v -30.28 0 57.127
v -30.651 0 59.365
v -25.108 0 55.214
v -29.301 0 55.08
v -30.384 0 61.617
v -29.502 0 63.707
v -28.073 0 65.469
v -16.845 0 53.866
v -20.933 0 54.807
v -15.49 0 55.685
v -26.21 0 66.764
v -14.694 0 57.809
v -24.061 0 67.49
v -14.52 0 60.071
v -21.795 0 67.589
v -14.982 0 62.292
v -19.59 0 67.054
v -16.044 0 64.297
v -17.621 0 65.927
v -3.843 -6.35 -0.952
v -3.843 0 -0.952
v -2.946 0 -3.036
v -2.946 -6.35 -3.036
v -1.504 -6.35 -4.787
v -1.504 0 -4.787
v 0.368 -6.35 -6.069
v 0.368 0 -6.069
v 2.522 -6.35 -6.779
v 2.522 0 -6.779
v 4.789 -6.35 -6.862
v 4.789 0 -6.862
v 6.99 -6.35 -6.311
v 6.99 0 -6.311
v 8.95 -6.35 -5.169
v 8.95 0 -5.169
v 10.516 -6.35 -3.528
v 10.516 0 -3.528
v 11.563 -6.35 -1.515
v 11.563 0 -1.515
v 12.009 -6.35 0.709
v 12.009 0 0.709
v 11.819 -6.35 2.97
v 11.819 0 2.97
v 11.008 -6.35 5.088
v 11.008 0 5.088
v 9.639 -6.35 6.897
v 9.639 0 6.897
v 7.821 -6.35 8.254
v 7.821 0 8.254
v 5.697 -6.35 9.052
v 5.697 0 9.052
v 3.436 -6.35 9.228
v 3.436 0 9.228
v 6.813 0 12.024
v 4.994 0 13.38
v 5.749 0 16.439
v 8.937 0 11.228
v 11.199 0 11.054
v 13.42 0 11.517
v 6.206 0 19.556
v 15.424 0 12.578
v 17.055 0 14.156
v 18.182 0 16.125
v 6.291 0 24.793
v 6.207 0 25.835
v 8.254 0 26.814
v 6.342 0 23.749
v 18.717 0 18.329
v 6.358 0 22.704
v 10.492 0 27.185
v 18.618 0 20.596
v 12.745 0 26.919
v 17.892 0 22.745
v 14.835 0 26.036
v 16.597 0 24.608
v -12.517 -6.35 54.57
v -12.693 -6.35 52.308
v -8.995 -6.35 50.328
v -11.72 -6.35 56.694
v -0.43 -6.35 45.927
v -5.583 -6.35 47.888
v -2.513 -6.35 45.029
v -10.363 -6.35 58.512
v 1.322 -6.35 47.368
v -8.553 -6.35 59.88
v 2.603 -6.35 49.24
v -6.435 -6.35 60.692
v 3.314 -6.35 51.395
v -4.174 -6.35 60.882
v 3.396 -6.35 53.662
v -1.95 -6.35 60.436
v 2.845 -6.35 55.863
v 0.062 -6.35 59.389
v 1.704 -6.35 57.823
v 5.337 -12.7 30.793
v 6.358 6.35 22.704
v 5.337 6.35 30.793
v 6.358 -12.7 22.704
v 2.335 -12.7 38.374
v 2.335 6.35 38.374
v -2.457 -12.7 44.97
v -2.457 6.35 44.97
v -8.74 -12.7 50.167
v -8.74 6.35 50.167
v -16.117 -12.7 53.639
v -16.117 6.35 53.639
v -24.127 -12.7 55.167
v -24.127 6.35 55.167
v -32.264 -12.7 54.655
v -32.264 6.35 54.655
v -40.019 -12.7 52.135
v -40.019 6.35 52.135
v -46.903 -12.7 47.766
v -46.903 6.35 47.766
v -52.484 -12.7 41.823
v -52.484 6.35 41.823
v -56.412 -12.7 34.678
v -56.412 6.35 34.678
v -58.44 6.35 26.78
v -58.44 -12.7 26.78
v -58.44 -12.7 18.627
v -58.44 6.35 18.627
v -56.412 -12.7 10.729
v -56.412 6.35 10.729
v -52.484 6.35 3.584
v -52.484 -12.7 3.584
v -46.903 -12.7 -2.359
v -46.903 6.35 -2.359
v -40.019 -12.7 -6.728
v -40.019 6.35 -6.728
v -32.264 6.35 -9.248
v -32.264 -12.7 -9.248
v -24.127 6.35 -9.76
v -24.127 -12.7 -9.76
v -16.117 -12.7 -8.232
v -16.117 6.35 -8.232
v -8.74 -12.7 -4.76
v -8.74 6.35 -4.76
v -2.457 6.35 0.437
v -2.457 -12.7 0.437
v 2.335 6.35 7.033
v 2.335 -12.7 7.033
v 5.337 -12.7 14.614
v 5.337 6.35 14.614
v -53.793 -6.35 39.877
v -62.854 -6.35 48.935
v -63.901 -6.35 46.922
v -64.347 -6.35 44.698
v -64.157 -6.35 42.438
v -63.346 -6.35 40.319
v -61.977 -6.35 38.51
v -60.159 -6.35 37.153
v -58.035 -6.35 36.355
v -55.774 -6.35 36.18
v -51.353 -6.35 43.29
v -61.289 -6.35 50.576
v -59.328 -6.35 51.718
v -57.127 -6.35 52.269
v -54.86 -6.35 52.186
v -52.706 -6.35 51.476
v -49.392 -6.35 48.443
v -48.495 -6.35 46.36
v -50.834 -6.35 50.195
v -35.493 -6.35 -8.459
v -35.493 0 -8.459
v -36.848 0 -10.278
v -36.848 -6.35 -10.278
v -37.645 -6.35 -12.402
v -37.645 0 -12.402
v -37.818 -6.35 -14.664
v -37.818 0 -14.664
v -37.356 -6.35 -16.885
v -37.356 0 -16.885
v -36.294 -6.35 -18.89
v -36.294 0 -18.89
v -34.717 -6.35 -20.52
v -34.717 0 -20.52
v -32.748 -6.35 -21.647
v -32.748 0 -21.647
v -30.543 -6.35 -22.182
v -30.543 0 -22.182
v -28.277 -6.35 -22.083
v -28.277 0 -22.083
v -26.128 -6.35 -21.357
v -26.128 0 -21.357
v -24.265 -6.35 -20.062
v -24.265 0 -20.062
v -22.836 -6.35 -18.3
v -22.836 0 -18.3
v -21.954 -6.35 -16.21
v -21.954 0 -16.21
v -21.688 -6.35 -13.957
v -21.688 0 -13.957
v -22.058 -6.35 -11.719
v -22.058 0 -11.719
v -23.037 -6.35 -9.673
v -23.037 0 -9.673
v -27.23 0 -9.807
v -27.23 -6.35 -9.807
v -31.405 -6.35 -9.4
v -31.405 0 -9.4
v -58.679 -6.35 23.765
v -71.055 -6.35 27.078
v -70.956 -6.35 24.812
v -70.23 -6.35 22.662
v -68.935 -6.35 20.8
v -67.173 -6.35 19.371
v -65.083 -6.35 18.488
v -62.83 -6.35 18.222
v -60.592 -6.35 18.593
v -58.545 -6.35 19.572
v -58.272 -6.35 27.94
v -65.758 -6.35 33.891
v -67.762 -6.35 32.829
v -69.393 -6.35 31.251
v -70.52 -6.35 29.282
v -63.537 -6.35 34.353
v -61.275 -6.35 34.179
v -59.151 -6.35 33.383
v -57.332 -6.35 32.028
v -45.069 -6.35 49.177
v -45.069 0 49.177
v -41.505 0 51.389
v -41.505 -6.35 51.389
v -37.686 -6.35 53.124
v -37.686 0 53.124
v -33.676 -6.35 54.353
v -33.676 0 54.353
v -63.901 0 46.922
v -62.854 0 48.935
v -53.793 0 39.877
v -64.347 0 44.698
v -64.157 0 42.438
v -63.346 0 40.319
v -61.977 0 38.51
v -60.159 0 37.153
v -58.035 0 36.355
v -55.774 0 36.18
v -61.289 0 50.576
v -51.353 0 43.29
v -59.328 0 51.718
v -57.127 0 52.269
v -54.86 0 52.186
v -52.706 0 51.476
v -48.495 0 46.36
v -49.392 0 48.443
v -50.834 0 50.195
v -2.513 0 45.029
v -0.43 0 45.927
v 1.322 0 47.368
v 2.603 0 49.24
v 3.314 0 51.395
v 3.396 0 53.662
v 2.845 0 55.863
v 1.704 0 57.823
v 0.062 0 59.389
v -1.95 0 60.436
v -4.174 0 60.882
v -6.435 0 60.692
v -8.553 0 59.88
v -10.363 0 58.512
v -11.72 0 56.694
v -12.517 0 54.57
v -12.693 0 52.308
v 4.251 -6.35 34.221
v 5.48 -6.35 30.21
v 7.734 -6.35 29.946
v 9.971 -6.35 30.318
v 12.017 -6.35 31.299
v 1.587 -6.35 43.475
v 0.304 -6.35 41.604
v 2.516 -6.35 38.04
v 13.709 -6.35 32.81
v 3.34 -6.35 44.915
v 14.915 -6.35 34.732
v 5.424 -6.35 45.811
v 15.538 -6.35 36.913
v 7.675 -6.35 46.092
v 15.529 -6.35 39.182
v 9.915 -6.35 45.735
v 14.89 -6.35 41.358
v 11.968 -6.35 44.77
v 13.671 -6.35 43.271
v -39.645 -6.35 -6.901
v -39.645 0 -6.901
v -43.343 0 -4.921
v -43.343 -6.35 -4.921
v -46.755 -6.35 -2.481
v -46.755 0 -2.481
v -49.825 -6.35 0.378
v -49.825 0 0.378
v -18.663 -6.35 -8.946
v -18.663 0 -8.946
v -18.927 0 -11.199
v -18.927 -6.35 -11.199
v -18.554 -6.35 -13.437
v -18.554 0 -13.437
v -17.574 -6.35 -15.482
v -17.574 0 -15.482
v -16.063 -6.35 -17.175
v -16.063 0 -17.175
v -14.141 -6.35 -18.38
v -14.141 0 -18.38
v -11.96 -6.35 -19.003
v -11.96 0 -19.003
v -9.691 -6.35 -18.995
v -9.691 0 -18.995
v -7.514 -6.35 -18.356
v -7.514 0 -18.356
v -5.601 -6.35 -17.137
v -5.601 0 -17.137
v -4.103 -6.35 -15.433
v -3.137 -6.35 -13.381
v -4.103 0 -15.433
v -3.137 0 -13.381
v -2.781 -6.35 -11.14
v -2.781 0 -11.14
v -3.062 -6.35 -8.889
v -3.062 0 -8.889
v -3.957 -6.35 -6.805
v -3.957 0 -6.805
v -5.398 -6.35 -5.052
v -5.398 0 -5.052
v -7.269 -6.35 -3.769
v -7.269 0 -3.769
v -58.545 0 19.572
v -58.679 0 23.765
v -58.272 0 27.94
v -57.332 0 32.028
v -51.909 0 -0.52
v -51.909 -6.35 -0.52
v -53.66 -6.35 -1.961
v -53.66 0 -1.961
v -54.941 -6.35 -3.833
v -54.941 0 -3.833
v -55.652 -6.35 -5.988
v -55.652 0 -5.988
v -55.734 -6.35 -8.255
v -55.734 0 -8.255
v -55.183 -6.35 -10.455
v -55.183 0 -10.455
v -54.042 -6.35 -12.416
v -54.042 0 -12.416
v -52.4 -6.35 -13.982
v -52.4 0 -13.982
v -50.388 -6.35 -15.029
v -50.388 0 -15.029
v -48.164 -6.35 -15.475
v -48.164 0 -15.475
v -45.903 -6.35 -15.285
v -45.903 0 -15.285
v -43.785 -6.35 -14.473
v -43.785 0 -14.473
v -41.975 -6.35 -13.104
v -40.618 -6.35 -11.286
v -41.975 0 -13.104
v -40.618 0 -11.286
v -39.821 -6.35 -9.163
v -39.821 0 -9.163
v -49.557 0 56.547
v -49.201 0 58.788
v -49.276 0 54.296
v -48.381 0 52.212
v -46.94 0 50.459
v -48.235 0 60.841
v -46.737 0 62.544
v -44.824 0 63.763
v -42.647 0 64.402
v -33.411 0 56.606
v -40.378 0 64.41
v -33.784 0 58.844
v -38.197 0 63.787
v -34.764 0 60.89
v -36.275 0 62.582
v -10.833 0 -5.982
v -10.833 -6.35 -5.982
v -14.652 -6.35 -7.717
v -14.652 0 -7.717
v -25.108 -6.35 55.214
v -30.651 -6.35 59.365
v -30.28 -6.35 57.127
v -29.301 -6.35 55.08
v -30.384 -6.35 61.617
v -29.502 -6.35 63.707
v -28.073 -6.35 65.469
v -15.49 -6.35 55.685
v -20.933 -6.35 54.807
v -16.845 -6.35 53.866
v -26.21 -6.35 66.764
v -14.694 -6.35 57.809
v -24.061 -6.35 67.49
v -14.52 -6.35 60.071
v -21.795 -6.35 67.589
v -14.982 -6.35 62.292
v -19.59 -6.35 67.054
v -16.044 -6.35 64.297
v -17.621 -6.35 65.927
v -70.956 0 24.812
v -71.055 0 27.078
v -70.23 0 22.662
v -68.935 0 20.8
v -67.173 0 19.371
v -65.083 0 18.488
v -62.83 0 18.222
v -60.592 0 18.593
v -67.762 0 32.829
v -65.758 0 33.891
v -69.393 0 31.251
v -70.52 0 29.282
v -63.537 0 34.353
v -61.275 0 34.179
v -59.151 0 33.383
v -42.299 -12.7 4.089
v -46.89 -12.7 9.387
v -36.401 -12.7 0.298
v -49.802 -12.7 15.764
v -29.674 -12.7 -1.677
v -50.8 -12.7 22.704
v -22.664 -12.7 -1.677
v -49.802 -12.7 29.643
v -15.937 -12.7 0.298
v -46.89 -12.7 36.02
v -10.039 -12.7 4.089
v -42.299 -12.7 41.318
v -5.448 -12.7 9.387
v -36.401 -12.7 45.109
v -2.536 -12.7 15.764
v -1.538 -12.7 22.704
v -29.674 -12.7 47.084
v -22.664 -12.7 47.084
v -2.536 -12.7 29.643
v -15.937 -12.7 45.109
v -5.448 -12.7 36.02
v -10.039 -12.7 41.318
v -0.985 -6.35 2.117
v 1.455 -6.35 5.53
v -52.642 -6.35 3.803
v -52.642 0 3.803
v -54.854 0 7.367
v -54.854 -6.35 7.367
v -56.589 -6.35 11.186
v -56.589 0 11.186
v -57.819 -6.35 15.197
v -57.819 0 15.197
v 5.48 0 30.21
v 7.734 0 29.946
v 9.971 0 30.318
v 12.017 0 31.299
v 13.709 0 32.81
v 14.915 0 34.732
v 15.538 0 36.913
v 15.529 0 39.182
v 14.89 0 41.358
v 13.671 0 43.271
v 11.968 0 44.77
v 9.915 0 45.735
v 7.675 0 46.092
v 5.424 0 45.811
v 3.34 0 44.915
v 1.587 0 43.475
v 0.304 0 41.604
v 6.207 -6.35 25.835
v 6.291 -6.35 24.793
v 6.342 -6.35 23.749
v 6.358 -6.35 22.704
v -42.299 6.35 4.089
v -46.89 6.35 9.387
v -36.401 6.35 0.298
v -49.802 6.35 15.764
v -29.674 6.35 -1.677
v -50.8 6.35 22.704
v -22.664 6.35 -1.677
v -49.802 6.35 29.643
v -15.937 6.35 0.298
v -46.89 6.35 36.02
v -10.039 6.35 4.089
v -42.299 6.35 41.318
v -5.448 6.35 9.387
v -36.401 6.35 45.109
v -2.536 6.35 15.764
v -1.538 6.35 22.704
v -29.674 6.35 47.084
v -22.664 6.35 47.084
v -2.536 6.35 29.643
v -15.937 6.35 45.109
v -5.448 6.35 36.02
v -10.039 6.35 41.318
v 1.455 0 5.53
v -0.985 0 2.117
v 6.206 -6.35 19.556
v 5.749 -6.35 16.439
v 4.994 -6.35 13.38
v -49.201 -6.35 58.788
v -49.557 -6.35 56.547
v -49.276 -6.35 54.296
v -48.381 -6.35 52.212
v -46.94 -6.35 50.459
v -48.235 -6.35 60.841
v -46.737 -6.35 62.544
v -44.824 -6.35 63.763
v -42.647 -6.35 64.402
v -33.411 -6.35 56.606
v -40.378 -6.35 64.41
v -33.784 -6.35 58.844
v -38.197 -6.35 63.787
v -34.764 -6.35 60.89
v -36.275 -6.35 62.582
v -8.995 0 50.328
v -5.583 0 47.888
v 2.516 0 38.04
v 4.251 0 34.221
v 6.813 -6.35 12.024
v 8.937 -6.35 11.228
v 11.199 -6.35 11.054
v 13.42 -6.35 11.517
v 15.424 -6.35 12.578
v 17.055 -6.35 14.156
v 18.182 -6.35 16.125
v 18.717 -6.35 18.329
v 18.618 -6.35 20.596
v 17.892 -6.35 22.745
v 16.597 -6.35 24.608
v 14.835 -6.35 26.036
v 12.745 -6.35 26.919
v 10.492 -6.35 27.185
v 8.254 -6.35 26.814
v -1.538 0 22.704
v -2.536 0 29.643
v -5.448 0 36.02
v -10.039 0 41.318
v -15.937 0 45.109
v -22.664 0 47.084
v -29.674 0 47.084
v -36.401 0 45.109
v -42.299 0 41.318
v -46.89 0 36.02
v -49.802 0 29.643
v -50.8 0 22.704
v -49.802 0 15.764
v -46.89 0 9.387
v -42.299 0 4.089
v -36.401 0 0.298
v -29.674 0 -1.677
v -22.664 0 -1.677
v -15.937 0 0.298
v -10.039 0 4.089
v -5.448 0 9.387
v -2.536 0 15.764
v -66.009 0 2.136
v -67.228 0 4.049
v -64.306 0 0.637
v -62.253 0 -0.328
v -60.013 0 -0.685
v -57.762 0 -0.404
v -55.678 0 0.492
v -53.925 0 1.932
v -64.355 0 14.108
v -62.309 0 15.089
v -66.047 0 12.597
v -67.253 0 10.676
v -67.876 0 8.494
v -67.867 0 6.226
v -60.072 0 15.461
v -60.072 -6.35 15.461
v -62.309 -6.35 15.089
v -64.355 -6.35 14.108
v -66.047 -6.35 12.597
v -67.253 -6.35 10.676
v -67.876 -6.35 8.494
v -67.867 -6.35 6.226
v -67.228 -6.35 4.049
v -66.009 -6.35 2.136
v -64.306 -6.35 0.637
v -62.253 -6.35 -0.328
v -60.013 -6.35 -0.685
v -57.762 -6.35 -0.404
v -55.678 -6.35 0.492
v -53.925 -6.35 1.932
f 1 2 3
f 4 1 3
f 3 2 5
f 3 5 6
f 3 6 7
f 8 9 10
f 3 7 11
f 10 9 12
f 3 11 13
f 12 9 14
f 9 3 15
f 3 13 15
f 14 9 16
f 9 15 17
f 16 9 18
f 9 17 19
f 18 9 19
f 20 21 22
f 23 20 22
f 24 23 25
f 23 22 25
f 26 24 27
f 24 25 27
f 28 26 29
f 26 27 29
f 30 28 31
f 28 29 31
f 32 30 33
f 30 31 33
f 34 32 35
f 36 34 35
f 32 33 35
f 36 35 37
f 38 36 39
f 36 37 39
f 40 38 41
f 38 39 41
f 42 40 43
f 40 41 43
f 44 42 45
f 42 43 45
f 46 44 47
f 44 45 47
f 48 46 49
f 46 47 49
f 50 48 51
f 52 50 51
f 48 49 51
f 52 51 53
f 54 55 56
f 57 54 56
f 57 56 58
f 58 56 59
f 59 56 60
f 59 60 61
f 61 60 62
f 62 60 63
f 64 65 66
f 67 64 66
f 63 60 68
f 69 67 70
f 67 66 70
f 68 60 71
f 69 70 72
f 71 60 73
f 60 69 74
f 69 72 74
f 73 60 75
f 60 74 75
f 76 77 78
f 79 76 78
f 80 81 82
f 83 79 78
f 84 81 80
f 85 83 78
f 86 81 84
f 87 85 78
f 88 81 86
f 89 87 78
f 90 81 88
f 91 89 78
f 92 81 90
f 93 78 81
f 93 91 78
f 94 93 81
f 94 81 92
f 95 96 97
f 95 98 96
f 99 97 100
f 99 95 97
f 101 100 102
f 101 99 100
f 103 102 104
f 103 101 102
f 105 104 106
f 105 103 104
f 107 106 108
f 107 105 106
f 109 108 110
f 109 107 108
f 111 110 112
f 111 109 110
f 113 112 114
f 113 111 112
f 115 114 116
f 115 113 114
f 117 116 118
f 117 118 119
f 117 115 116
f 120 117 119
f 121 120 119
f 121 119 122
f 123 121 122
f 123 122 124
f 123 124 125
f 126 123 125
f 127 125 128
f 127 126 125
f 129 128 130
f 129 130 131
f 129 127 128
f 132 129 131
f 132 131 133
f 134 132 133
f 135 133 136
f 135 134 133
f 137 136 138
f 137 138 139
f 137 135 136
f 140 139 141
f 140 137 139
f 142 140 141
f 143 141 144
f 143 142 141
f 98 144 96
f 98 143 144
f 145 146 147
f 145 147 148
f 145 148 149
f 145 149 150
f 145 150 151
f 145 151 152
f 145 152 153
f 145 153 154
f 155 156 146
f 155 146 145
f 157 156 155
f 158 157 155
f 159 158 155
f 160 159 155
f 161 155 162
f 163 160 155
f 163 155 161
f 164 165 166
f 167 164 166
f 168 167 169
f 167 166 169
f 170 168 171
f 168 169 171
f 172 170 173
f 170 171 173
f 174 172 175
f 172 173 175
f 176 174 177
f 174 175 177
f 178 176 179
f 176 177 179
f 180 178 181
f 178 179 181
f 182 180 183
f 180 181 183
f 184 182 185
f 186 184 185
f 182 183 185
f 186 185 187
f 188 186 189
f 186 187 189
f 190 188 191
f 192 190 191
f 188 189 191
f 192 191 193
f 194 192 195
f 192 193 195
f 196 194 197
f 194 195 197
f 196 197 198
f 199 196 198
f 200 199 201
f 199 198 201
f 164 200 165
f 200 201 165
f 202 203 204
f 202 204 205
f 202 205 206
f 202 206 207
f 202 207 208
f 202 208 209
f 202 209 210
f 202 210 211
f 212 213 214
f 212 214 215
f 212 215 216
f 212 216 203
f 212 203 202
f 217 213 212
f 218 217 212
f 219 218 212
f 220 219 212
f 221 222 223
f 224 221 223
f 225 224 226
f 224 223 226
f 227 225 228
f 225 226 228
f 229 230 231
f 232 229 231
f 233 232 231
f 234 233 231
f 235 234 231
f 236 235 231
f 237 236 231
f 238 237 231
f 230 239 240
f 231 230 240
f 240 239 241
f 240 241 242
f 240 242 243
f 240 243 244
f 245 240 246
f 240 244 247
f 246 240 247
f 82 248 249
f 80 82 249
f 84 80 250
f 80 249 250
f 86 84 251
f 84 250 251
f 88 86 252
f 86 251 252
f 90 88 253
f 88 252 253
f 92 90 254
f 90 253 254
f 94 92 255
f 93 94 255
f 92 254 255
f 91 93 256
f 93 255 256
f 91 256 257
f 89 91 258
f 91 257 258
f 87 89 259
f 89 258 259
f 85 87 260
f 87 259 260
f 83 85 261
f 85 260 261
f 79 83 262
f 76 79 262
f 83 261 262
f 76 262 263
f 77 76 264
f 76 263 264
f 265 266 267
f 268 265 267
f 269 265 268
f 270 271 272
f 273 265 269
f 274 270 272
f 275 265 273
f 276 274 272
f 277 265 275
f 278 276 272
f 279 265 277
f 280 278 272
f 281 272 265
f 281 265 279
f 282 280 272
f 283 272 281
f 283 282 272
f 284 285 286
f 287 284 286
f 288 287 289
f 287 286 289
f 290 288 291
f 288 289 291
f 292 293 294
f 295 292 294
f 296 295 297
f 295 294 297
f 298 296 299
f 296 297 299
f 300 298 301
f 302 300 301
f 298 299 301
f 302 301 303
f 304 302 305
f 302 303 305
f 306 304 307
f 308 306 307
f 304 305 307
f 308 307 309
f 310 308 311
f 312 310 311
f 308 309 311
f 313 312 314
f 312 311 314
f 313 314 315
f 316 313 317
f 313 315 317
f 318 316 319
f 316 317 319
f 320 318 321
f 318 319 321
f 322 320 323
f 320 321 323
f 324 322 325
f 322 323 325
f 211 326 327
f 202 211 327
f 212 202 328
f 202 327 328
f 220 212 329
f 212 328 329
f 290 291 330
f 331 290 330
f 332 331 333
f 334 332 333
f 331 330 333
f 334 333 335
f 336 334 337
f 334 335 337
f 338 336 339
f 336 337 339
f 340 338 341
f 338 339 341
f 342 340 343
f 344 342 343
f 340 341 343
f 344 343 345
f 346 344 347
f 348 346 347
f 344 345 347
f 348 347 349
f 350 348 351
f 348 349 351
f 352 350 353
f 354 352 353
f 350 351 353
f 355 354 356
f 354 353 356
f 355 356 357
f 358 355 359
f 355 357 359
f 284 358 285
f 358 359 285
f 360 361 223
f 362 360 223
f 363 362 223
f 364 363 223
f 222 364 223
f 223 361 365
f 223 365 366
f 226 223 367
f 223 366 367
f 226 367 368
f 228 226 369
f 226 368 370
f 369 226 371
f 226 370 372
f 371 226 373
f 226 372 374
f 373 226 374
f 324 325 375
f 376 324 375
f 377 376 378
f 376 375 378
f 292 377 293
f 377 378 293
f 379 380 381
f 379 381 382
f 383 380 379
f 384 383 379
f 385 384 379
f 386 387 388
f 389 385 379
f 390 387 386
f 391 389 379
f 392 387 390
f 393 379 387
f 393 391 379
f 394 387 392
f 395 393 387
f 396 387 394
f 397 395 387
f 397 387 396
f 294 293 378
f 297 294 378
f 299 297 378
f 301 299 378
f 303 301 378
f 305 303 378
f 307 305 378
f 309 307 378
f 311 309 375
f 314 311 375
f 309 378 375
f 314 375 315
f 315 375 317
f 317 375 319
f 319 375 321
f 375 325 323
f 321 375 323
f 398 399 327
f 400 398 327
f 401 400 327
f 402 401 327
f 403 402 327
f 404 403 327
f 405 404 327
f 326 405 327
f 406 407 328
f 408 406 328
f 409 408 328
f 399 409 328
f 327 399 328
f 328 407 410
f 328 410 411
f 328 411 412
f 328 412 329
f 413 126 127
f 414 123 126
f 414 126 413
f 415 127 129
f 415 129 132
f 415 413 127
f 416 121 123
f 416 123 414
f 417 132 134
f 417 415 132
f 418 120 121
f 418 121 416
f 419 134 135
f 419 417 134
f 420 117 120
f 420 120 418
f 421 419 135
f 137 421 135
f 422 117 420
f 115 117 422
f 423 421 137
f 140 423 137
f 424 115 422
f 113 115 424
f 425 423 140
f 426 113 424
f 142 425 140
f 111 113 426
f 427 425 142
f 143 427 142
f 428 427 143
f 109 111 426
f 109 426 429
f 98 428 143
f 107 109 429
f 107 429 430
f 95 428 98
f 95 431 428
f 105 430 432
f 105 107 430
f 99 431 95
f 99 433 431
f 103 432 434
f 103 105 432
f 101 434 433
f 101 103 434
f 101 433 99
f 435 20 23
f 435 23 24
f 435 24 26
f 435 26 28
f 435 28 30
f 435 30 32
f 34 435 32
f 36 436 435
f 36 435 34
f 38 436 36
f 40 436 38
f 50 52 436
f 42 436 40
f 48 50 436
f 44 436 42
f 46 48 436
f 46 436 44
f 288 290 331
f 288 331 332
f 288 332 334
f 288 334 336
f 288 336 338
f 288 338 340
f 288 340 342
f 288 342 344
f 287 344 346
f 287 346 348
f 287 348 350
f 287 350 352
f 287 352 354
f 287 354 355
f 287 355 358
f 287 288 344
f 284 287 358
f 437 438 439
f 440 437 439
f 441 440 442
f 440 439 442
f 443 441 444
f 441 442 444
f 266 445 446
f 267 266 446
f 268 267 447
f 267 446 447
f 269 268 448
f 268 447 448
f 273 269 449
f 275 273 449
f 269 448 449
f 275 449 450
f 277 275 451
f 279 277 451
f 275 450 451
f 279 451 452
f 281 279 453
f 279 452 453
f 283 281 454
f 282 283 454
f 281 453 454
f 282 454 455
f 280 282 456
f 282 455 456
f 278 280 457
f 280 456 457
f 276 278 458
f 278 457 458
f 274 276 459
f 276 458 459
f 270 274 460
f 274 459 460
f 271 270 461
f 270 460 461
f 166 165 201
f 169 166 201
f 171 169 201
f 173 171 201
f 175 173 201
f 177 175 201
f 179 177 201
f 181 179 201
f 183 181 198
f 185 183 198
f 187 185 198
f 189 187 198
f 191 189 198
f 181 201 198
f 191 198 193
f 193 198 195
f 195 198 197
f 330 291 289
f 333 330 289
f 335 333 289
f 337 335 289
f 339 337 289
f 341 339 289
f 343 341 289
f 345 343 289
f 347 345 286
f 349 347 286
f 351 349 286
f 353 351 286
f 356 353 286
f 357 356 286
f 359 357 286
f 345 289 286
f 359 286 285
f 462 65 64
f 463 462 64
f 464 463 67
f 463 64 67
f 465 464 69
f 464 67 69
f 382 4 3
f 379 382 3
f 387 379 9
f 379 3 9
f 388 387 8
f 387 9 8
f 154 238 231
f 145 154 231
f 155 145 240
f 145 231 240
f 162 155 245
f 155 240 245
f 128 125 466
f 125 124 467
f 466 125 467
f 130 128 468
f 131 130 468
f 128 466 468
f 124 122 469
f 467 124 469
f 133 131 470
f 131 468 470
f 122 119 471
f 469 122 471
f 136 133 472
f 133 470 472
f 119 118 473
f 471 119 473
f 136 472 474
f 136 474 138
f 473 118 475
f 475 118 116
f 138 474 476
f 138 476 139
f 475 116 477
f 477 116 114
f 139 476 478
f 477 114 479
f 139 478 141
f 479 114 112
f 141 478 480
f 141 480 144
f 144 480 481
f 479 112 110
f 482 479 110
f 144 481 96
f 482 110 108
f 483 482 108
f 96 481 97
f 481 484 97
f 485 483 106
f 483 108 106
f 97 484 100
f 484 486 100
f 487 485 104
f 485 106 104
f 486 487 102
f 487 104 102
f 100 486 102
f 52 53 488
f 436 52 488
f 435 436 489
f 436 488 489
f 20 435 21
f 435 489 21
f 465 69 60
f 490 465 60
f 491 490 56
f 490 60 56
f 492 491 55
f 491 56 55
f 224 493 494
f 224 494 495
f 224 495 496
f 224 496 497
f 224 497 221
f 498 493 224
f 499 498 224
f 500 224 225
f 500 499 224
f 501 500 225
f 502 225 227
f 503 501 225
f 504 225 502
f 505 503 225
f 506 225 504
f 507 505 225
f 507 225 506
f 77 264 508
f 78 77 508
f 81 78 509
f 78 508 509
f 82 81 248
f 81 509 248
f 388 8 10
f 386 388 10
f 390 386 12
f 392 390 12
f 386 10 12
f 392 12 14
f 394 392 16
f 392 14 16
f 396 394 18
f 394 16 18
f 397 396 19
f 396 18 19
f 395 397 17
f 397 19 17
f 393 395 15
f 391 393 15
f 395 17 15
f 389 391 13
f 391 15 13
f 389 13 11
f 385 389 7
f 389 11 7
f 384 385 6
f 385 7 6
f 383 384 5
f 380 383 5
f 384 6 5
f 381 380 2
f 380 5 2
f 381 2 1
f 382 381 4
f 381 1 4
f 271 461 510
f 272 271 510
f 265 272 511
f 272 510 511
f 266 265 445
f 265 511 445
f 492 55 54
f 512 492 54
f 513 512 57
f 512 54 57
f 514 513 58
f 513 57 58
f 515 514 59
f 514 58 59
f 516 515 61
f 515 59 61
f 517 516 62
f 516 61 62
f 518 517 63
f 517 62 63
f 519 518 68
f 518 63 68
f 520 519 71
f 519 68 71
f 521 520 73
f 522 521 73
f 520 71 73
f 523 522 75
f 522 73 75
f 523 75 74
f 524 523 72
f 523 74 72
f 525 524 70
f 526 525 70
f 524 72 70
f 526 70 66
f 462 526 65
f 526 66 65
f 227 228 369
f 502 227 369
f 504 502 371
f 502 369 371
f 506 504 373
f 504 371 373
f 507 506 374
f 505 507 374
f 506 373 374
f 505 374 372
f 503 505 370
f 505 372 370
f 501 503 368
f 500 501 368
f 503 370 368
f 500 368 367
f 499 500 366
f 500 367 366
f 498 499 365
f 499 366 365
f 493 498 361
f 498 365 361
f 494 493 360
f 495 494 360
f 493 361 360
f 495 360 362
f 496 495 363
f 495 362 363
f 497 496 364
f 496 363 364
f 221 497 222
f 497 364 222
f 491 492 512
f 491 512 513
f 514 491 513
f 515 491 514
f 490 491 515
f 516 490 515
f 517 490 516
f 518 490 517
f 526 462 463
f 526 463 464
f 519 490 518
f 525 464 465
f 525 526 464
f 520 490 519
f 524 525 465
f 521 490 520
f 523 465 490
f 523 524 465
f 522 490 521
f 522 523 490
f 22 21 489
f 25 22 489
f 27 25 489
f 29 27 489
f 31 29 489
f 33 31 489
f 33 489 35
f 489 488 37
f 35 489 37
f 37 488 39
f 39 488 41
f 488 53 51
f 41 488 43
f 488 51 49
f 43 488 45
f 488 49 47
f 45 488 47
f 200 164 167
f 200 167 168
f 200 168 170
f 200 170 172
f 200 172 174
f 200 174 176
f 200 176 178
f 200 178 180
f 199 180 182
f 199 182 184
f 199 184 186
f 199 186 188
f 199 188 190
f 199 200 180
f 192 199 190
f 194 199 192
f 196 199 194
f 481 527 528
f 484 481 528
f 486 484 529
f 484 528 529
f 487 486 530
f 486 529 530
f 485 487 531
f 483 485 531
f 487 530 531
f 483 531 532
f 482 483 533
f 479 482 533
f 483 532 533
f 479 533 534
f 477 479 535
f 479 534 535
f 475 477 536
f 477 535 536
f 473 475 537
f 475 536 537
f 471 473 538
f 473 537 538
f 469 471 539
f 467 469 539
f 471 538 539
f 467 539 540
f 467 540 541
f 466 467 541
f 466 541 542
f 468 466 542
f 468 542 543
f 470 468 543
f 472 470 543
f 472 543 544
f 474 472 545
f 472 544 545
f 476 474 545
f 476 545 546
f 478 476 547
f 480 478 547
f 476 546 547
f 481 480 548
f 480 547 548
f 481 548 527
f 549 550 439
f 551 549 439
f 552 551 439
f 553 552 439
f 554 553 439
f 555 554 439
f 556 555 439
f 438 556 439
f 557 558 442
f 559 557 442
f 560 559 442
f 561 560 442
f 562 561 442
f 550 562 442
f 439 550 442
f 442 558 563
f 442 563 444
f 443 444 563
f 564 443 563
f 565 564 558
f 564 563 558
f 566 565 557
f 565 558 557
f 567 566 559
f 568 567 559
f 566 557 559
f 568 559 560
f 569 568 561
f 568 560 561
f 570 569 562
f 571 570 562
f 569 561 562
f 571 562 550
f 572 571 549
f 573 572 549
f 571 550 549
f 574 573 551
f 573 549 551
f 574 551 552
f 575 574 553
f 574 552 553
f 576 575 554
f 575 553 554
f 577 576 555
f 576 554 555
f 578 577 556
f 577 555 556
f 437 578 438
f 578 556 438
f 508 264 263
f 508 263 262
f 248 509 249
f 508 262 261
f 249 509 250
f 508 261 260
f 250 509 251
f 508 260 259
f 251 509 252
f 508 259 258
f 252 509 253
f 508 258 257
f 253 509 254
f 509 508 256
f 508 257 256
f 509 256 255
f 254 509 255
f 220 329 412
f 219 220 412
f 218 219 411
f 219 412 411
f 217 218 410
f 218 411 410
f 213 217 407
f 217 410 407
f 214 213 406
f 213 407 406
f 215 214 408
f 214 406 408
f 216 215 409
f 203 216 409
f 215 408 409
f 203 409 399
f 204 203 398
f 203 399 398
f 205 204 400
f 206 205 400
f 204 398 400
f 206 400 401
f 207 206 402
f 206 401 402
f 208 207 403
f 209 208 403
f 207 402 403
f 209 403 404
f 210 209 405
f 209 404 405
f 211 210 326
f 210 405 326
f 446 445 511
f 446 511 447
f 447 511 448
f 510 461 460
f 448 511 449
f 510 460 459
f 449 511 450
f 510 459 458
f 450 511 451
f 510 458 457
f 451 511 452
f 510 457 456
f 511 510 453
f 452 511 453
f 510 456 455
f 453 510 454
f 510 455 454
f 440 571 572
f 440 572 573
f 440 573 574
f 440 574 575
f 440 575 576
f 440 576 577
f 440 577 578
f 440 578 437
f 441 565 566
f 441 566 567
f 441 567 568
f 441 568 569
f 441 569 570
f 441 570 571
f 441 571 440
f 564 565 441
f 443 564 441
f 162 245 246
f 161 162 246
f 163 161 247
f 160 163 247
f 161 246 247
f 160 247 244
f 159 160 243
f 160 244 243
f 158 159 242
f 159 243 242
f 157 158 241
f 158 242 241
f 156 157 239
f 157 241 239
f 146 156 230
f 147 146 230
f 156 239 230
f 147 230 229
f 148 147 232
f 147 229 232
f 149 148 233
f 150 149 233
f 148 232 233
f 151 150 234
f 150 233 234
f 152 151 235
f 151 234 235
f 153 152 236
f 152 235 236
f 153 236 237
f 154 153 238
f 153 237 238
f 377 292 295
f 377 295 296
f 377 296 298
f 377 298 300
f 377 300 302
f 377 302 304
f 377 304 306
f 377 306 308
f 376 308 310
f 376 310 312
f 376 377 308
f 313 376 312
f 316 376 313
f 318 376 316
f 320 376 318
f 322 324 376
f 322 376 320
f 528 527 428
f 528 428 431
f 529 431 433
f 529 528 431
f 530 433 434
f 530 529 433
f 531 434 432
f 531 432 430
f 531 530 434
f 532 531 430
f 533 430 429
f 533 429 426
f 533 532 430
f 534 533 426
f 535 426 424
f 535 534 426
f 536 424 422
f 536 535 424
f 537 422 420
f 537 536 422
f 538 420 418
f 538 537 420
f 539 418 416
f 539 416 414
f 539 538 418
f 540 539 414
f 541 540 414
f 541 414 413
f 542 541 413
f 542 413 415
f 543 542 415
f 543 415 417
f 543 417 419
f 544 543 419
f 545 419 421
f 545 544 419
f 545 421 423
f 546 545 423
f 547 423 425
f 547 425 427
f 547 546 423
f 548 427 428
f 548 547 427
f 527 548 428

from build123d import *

# Parameters (mm, degrees)
F3_DEPTH      = 6.35
F4_R          = 32.5275336584
F4_R_2        = 24.6309625536
F5_DEPTH      = 12.7
F5_DEPTH_BACK = 6.35


# Not quite as in the source:
# - the program builds the solid bodies; features that only make, move or delete a surface that nothing else refers to are left out


with BuildPart() as f3:
    # F2 (on Front) → F3 (new body)
    with BuildSketch(Plane.XZ):
        with BuildLine():
            ThreePointArc((-57.3315931421, 32.0275125267), (-71.0548866609, 27.0779234756), (-58.5454572214, 19.5718331568))
            ThreePointArc((-58.5454572214, 19.5718331568), (-58.5431990279, 25.8586011297), (-57.3315931421, 32.0275125267))
        make_face()
    extrude(amount=F3_DEPTH)


with BuildPart() as f3b:
    # F2 (on Front) → F3, piece 2 (new body)
    with BuildSketch(Plane.XZ):
        with BuildLine():
            ThreePointArc((-48.4946400668, 46.3596213521), (-62.8541554032, 48.934798255), (-55.7737168812, 36.179618636))
            ThreePointArc((-55.7737168812, 36.179618636), (-52.6283772418, 41.6229903116), (-48.4946400668, 46.3596213521))
        make_face()
    extrude(amount=F3_DEPTH)


with BuildPart() as f3c:
    # F2 (on Front) → F3, piece 3 (new body)
    with BuildSketch(Plane.XZ):
        with BuildLine():
            ThreePointArc((-33.6755597989, 54.3531151471), (-44.8236764147, 63.7630414325), (-45.0694265942, 49.1765125916))
            ThreePointArc((-45.0694265942, 49.1765125916), (-39.6237967252, 52.3179409251), (-33.6755597989, 54.3531151471))
        make_face()
    extrude(amount=F3_DEPTH)


with BuildPart() as f3d:
    # F2 (on Front) → F3, piece 4 (new body)
    with BuildSketch(Plane.XZ):
        with BuildLine():
            ThreePointArc((-16.8451129286, 53.8661437046), (-21.7947019796, 67.5894372234), (-29.3007922985, 55.0800077839))
            ThreePointArc((-29.3007922985, 55.0800077839), (-23.0140243255, 55.0777495904), (-16.8451129286, 53.8661437046))
        make_face()
    extrude(amount=F3_DEPTH)


with BuildPart() as f3e:
    # F2 (on Front) → F3, piece 5 (new body)
    with BuildSketch(Plane.XZ):
        with BuildLine():
            ThreePointArc((-2.5130041032, 45.0291906293), (0.0621727998, 59.3887059657), (-12.6930068192, 52.3082674437))
            ThreePointArc((-12.6930068192, 52.3082674437), (-7.2496351437, 49.1629278043), (-2.5130041032, 45.0291906293))
        make_face()
    extrude(amount=F3_DEPTH)


with BuildPart() as f3f:
    # F2 (on Front) → F3, piece 6 (new body)
    with BuildSketch(Plane.XZ):
        with BuildLine():
            ThreePointArc((5.4804896918, 30.2101103614), (14.8904159772, 41.3582269772), (0.3038871363, 41.6039771567))
            ThreePointArc((0.3038871363, 41.6039771567), (3.4453154699, 36.1583472877), (5.4804896918, 30.2101103614))
        make_face()
    extrude(amount=F3_DEPTH)


with BuildPart() as f3g:
    # F2 (on Front) → F3, piece 7 (new body)
    with BuildSketch(Plane.XZ):
        with BuildLine():
            ThreePointArc((6.3584962121, 22.7035880089), (6.0154427046, 17.9919340198), (4.9935182493, 13.3796634911))
            ThreePointArc((4.9935182493, 13.3796634911), (18.7168117681, 18.3292525421), (6.2073823286, 25.835342861))
            ThreePointArc((6.2073823286, 25.835342861), (6.3206957771, 24.2712872673), (6.3584962121, 22.7035880089))
        make_face()
    extrude(amount=F3_DEPTH)


with BuildPart() as f3h:
    # F2 (on Front) → F3, piece 8 (new body)
    with BuildSketch(Plane.XZ):
        with BuildLine():
            ThreePointArc((3.4356419884, 9.2275573817), (0.290302349, 3.7841857062), (-3.843434826, -0.9524453343))
            ThreePointArc((-3.843434826, -0.9524453343), (10.5160805105, -3.5276222373), (3.4356419884, 9.2275573817))
        make_face()
    extrude(amount=F3_DEPTH)


with BuildPart() as f3i:
    # F2 (on Front) → F3, piece 9 (new body)
    with BuildSketch(Plane.XZ):
        with BuildLine():
            ThreePointArc((-23.0372825943, -9.6728317661), (-29.3240505672, -9.6705735727), (-35.4929619642, -8.4589676868))
            ThreePointArc((-35.4929619642, -8.4589676868), (-30.5433729131, -22.1822612056), (-23.0372825943, -9.6728317661))
        make_face()
    extrude(amount=F3_DEPTH)


with BuildPart() as f3j:
    # F2 (on Front) → F3, piece 10 (new body)
    with BuildSketch(Plane.XZ):
        with BuildLine():
            ThreePointArc((-7.2686482985, -3.7693365738), (-12.7142781676, -6.9107649074), (-18.6625150939, -8.9459391293))
            ThreePointArc((-18.6625150939, -8.9459391293), (-7.514398478, -18.3558654147), (-7.2686482985, -3.7693365738))
        make_face()
    extrude(amount=F3_DEPTH)


with BuildPart() as f3k:
    # F2 (on Front) → F3, piece 11 (new body)
    with BuildSketch(Plane.XZ):
        with BuildLine():
            ThreePointArc((-39.6450680735, -6.9010914259), (-45.0884397491, -3.7557517865), (-49.8250707896, 0.3779853885))
            ThreePointArc((-49.8250707896, 0.3779853885), (-52.4002476925, -13.981529948), (-39.6450680735, -6.9010914259))
        make_face()
    extrude(amount=F3_DEPTH)


with BuildPart() as f3l:
    # F2 (on Front) → F3, piece 12 (new body)
    with BuildSketch(Plane.XZ):
        with BuildLine():
            ThreePointArc((-52.6419620291, 3.803198861), (-55.7833903626, 9.2488287301), (-57.8185645846, 15.1970656564))
            ThreePointArc((-57.8185645846, 15.1970656564), (-67.22849087, 4.0489490405), (-52.6419620291, 3.803198861))
        make_face()
    extrude(amount=F3_DEPTH)


with BuildPart() as f5:
    # F4 (on Front) → F5 (new body, two sides)
    with BuildSketch(Plane.XZ) as f5_sk:
        with Locations((-26.1690374464, 22.7035880089)):
            Circle(F4_R)
        with Locations((-26.1690374464, 22.7035880089)):
            Circle(F4_R_2, mode=Mode.SUBTRACT)
    extrude(amount=F5_DEPTH)
    extrude(f5_sk.sketch, amount=-F5_DEPTH_BACK)


solid = Compound([f3.part, f3b.part, f3c.part, f3d.part, f3e.part, f3f.part, f3g.part, f3h.part, f3i.part, f3j.part, f3k.part, f3l.part, f5.part])
